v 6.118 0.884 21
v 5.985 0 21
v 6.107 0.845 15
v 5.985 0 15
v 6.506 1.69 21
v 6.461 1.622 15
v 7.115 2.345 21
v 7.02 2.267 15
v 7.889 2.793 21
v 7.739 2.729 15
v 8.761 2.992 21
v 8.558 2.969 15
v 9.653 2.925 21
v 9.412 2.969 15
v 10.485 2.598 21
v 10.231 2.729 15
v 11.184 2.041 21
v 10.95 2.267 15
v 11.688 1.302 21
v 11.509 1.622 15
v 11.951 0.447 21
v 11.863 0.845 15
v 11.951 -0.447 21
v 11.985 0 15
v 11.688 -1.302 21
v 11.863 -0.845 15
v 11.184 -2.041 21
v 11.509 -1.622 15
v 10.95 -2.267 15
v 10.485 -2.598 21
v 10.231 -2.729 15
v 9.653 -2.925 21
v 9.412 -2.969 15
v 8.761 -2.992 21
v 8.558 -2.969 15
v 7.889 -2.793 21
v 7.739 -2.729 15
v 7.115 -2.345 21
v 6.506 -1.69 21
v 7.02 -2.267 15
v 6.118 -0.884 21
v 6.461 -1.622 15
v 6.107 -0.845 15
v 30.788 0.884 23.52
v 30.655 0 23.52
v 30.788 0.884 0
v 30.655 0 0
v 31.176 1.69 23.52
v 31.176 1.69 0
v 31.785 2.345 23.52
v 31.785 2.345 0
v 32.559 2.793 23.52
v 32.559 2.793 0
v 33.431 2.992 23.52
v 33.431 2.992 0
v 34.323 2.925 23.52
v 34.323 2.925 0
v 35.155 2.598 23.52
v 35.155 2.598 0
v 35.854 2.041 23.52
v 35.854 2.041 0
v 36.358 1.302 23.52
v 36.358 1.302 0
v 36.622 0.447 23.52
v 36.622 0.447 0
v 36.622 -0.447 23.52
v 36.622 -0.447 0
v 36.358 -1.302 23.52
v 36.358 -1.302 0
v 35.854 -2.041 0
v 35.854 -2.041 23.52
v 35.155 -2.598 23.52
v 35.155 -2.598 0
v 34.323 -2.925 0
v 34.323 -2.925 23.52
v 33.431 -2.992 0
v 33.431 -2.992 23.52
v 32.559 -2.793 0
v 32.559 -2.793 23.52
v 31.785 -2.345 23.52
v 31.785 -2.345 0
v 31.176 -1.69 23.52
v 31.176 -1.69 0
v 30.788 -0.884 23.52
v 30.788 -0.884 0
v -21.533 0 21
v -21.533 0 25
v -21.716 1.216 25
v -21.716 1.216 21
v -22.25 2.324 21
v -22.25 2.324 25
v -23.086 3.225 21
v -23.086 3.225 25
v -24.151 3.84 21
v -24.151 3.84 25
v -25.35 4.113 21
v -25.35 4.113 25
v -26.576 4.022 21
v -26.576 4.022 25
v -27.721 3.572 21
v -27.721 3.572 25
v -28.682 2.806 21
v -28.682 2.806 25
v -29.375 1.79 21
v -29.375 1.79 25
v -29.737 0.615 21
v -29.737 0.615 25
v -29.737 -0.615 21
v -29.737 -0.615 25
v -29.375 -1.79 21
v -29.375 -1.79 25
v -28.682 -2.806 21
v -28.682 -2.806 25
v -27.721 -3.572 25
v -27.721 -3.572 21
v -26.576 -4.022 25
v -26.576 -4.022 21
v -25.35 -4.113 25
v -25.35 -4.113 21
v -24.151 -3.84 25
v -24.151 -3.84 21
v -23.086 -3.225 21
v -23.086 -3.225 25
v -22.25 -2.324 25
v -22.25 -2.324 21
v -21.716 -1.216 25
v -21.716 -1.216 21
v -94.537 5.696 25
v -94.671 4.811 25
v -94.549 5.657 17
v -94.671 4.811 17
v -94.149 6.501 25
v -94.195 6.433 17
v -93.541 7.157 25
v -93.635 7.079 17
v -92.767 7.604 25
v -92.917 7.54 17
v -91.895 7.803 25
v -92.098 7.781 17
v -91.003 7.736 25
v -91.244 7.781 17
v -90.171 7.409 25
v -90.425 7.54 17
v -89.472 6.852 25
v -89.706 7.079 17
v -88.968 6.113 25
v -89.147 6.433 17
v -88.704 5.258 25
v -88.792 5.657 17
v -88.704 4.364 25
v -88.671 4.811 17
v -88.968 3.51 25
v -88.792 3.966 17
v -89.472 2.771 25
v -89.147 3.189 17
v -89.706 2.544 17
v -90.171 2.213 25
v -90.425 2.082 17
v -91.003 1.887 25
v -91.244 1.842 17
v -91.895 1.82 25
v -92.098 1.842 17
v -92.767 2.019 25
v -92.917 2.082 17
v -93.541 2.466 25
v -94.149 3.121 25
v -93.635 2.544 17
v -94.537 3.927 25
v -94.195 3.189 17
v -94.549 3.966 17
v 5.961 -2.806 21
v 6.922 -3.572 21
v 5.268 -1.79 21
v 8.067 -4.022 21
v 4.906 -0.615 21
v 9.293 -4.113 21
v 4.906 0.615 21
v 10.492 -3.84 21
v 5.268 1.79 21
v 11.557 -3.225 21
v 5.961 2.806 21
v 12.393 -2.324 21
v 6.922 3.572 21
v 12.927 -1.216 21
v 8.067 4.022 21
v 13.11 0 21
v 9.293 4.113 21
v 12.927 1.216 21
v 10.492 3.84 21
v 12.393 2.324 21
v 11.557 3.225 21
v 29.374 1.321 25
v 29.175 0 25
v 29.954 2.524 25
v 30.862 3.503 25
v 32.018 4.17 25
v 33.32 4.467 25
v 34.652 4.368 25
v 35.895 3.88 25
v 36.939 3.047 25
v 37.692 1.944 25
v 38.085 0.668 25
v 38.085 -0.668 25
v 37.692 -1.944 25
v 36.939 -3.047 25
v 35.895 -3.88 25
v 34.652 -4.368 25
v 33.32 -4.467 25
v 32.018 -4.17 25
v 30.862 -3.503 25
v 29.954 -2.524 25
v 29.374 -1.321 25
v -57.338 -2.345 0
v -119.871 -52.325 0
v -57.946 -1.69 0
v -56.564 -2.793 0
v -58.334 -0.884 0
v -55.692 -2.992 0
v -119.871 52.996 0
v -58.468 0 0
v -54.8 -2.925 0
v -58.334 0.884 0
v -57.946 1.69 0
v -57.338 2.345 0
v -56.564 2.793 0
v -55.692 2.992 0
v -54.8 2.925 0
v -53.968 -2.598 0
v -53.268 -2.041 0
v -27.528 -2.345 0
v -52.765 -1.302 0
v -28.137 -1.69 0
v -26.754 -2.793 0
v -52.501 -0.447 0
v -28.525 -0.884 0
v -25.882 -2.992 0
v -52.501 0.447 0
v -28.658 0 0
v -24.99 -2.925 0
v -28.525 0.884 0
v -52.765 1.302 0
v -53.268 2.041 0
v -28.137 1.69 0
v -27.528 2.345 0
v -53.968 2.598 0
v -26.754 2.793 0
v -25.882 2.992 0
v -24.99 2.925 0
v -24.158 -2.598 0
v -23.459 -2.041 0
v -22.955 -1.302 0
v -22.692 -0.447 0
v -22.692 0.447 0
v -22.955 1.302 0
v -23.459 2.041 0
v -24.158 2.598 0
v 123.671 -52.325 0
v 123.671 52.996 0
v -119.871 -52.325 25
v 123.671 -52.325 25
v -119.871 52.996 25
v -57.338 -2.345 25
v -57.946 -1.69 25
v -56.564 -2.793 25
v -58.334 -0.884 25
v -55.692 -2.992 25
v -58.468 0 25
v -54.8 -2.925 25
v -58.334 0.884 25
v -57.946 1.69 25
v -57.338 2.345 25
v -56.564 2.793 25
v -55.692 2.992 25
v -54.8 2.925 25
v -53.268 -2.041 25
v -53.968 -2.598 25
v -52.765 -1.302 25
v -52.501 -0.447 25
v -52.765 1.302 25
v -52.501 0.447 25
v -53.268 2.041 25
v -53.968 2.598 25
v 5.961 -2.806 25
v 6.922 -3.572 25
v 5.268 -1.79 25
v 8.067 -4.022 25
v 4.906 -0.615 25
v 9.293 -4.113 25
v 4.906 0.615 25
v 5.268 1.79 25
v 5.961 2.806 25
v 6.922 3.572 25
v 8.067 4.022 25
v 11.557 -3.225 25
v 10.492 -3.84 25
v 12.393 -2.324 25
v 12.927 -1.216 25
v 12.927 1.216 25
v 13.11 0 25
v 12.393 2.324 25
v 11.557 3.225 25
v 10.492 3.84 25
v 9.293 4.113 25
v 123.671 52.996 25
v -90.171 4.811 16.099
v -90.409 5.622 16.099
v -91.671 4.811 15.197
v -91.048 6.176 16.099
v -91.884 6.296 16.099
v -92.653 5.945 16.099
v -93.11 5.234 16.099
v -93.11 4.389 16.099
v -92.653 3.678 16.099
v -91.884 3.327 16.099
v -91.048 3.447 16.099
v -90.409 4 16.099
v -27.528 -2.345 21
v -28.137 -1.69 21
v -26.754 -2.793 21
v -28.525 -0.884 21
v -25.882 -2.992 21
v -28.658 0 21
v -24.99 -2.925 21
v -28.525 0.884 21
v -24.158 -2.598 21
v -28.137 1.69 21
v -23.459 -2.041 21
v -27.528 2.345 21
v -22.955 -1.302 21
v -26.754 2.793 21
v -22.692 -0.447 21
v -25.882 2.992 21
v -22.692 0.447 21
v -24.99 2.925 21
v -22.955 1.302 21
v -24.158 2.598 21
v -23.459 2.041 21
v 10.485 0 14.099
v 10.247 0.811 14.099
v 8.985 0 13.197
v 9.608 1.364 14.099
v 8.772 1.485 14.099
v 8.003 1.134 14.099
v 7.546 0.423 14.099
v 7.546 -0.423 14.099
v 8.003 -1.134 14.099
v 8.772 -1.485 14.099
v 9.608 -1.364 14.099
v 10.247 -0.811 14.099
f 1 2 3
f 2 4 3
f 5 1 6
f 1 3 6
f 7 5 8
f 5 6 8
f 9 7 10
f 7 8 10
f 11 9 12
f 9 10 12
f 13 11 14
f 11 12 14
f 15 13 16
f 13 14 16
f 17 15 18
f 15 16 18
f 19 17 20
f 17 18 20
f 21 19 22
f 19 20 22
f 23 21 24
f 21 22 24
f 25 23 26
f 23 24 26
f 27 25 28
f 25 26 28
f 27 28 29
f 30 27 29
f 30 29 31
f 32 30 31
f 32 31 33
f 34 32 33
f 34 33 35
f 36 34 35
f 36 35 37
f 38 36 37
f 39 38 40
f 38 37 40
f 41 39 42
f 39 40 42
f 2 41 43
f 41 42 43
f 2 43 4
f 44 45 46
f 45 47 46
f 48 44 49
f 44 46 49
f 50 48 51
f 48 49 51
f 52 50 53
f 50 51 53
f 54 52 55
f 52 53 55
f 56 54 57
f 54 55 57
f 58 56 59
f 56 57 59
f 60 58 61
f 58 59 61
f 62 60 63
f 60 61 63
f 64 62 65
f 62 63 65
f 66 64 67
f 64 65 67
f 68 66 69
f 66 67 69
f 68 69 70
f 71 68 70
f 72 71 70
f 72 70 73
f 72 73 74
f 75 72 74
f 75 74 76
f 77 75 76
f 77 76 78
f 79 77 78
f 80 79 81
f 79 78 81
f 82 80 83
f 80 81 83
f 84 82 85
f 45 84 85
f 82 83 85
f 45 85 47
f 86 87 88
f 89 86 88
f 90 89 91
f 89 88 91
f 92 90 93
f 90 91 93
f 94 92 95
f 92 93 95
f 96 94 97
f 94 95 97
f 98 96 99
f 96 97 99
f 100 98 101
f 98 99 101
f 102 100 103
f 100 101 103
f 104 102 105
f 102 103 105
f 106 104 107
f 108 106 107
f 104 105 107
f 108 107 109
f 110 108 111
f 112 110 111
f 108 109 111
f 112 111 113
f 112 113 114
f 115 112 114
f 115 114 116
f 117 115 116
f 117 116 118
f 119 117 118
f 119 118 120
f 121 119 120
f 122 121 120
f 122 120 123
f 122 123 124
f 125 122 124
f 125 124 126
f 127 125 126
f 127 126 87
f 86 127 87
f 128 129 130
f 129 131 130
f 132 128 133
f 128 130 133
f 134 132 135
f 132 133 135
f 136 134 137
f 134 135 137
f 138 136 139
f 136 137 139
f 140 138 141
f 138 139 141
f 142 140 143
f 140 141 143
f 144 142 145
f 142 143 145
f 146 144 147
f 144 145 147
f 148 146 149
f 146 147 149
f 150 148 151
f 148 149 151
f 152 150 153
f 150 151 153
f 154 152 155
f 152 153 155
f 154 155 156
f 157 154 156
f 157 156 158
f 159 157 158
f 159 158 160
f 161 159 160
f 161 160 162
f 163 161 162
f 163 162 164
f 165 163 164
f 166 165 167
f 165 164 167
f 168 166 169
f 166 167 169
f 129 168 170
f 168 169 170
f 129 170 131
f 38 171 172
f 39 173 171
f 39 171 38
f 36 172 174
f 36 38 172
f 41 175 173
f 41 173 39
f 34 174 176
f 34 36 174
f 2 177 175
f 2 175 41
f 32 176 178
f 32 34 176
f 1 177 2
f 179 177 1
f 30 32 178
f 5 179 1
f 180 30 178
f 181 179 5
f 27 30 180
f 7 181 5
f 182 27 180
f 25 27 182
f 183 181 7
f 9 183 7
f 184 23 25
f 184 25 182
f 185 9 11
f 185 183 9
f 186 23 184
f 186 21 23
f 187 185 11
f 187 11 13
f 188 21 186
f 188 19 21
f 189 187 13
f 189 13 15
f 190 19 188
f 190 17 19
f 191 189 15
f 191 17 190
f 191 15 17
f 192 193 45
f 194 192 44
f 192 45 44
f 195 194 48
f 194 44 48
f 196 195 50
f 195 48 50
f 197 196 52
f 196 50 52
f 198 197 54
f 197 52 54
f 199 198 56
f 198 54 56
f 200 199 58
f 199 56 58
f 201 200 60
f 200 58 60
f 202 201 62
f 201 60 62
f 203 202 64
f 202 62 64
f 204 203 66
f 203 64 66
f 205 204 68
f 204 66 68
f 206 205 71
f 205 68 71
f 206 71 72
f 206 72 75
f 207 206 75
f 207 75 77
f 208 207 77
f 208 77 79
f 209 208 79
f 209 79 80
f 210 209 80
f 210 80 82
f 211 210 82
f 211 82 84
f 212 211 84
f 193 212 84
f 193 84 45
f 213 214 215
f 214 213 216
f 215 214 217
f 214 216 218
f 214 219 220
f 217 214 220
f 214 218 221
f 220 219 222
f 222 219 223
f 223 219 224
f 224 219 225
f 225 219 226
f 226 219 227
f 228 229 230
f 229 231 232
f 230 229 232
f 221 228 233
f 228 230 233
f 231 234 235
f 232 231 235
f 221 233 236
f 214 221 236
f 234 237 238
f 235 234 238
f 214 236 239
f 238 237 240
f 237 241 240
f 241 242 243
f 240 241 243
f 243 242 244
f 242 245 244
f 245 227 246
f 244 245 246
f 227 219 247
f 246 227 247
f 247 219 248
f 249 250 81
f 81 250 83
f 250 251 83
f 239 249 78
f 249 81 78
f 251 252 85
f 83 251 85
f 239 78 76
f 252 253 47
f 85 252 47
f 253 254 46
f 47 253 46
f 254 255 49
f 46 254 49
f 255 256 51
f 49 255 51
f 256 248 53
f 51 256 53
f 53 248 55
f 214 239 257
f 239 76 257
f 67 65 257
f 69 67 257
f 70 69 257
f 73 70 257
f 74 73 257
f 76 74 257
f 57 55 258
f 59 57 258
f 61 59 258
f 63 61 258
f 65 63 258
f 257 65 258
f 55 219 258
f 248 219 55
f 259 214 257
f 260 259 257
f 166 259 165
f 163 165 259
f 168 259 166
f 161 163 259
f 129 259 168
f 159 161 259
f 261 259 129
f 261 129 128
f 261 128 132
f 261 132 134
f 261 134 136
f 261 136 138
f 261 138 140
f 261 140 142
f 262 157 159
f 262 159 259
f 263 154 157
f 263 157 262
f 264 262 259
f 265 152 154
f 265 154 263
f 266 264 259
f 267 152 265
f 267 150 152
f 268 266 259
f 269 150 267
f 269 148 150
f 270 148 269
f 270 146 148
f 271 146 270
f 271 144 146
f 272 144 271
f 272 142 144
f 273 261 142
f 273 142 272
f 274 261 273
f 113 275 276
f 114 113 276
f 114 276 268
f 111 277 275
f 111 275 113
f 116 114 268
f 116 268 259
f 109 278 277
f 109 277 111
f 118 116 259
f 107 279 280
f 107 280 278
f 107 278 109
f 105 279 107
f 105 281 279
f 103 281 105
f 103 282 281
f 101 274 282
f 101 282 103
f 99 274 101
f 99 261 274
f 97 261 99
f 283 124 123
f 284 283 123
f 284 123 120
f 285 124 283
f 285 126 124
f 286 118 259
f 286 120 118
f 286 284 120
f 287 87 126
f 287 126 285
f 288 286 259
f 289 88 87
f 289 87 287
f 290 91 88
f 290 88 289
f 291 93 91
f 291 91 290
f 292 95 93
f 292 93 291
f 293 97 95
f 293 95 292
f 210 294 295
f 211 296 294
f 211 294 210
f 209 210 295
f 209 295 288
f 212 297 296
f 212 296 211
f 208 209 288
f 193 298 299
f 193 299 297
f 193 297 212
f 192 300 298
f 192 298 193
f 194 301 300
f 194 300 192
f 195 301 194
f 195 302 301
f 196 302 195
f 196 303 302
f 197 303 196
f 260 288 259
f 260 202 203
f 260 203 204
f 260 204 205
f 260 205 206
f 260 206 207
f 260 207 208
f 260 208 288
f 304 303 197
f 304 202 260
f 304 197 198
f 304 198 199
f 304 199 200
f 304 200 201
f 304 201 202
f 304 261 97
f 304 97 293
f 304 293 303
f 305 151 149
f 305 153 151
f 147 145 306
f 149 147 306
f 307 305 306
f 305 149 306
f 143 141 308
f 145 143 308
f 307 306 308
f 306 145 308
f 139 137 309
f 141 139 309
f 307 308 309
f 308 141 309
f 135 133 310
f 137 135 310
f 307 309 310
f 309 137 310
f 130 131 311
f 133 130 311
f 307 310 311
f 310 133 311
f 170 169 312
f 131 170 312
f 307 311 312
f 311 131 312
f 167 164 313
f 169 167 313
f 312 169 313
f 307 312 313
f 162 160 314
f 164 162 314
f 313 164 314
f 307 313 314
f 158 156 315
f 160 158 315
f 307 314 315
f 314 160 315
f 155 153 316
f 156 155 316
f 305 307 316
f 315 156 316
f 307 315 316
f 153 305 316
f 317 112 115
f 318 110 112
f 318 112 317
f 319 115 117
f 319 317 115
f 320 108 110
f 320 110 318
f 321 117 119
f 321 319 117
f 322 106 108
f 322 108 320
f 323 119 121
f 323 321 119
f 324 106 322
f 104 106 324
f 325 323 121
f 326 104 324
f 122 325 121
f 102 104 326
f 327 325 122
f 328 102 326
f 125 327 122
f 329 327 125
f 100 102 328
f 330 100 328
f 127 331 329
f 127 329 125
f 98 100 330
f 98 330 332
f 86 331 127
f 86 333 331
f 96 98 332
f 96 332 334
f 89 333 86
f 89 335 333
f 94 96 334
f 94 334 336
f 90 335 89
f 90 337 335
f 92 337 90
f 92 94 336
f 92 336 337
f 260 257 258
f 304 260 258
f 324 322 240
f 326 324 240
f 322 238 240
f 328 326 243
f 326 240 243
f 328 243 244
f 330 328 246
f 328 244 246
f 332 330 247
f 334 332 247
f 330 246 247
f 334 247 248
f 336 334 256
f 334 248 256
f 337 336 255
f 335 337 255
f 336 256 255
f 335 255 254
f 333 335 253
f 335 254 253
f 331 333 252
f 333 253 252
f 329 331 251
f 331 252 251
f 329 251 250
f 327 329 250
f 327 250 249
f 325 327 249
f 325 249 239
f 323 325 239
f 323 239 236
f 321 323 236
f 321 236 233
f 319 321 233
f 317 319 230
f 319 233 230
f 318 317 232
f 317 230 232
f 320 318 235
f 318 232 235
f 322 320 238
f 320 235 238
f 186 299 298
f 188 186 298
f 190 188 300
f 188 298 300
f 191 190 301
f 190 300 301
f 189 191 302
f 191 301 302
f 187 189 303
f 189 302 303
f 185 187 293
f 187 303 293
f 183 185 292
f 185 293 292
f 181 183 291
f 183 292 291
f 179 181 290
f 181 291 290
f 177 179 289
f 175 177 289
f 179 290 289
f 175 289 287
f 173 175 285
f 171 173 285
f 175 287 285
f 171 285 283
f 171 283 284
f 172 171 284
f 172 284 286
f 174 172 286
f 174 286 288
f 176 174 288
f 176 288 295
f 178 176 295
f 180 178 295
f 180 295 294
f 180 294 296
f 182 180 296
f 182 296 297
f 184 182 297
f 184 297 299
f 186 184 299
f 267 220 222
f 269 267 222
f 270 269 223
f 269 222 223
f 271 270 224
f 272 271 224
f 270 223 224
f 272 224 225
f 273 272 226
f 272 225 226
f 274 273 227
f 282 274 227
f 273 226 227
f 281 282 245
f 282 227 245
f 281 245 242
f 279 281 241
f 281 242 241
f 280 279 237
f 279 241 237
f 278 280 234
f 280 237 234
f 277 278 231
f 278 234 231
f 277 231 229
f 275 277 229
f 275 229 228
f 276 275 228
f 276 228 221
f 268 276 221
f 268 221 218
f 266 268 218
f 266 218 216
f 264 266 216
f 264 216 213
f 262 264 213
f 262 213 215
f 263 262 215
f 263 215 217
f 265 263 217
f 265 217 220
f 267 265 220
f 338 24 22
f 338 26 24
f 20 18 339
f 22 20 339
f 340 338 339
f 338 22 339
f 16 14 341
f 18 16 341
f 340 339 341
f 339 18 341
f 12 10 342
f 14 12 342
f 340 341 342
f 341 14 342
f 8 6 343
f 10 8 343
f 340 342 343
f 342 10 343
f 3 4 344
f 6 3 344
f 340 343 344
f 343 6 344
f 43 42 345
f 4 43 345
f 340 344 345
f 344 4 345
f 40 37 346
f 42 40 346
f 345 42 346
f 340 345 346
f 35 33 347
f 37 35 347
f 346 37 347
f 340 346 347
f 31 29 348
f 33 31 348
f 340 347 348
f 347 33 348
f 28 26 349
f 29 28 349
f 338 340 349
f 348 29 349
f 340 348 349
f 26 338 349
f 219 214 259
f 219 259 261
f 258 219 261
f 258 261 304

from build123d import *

# Parameters (mm, degrees)
F0_W           = 243.5423284769
F0_H           = 105.3215228021
F1_DEPTH       = 25
F3_D           = 6
F3_DEPTH       = 8
F3_TIP         = 1.8025818571
F4_D           = 6
F4_DEPTH       = 80
F4_TIP         = 1.8025818571
F5_D           = 6
F5_DEPTH       = 80
F5_CBORE_D     = 8.25
F5_CBORE_DEPTH = 4
F5_TIP         = 1.8025818571
F6_D           = 6
F6_DEPTH       = 10
F6_CBORE_D     = 8.25
F6_CBORE_DEPTH = 4
F6_TIP         = 1.8025818571
F7_D           = 6
F7_DEPTH       = 50
F7_CSINK_D     = 8.96
F7_CSINK_ANGLE = 90
F7_TIP         = 1.8025818571


with BuildPart() as f1:
    # F0 (on Top) → F1 (new body)
    with BuildSketch(Plane.XY):
        with Locations((1.9000694156, 0.3356132656)):
            Rectangle(F0_W, F0_H)
    extrude(amount=F1_DEPTH)

    # F3
    with Locations(Plane.XY.offset(25)):
        with Locations((-91.6707515717, 4.8113325611)):
            Hole(F3_D / 2, depth=F3_DEPTH)
            with Locations((0, 0, -(F3_DEPTH + F3_TIP / 2))):  # 118° drill point
                Cone(0, F3_D / 2, F3_TIP, mode=Mode.SUBTRACT)

    # F4
    with Locations(Plane.XY.offset(25)):
        with Locations((-55.4676242173, 0)):
            Hole(F4_D / 2, depth=F4_DEPTH)
            with Locations((0, 0, -(F4_DEPTH + F4_TIP / 2))):  # 118° drill point
                Cone(0, F4_D / 2, F4_TIP, mode=Mode.SUBTRACT)

    # F5
    with Locations(Plane.XY.offset(25)):
        with Locations((-25.6580132991, 0)):
            CounterBoreHole(F5_D / 2, F5_CBORE_D / 2, F5_CBORE_DEPTH, depth=F5_DEPTH)
            with Locations((0, 0, -(F5_DEPTH + F5_TIP / 2))):  # 118° drill point
                Cone(0, F5_D / 2, F5_TIP, mode=Mode.SUBTRACT)

    # F6
    with Locations(Plane.XY.offset(25)):
        with Locations((8.9849950746, 0)):
            CounterBoreHole(F6_D / 2, F6_CBORE_D / 2, F6_CBORE_DEPTH, depth=F6_DEPTH)
            with Locations((0, 0, -(F6_DEPTH + F6_TIP / 2))):  # 118° drill point
                Cone(0, F6_D / 2, F6_TIP, mode=Mode.SUBTRACT)

    # F7
    with Locations(Plane.XY.offset(25)):
        with Locations((33.6551889777, 0)):
            CounterSinkHole(F7_D / 2, F7_CSINK_D / 2, depth=F7_DEPTH, counter_sink_angle=F7_CSINK_ANGLE)
            with Locations((0, 0, -(F7_DEPTH + F7_TIP / 2))):  # 118° drill point
                Cone(0, F7_D / 2, F7_TIP, mode=Mode.SUBTRACT)


solid = f1.part
